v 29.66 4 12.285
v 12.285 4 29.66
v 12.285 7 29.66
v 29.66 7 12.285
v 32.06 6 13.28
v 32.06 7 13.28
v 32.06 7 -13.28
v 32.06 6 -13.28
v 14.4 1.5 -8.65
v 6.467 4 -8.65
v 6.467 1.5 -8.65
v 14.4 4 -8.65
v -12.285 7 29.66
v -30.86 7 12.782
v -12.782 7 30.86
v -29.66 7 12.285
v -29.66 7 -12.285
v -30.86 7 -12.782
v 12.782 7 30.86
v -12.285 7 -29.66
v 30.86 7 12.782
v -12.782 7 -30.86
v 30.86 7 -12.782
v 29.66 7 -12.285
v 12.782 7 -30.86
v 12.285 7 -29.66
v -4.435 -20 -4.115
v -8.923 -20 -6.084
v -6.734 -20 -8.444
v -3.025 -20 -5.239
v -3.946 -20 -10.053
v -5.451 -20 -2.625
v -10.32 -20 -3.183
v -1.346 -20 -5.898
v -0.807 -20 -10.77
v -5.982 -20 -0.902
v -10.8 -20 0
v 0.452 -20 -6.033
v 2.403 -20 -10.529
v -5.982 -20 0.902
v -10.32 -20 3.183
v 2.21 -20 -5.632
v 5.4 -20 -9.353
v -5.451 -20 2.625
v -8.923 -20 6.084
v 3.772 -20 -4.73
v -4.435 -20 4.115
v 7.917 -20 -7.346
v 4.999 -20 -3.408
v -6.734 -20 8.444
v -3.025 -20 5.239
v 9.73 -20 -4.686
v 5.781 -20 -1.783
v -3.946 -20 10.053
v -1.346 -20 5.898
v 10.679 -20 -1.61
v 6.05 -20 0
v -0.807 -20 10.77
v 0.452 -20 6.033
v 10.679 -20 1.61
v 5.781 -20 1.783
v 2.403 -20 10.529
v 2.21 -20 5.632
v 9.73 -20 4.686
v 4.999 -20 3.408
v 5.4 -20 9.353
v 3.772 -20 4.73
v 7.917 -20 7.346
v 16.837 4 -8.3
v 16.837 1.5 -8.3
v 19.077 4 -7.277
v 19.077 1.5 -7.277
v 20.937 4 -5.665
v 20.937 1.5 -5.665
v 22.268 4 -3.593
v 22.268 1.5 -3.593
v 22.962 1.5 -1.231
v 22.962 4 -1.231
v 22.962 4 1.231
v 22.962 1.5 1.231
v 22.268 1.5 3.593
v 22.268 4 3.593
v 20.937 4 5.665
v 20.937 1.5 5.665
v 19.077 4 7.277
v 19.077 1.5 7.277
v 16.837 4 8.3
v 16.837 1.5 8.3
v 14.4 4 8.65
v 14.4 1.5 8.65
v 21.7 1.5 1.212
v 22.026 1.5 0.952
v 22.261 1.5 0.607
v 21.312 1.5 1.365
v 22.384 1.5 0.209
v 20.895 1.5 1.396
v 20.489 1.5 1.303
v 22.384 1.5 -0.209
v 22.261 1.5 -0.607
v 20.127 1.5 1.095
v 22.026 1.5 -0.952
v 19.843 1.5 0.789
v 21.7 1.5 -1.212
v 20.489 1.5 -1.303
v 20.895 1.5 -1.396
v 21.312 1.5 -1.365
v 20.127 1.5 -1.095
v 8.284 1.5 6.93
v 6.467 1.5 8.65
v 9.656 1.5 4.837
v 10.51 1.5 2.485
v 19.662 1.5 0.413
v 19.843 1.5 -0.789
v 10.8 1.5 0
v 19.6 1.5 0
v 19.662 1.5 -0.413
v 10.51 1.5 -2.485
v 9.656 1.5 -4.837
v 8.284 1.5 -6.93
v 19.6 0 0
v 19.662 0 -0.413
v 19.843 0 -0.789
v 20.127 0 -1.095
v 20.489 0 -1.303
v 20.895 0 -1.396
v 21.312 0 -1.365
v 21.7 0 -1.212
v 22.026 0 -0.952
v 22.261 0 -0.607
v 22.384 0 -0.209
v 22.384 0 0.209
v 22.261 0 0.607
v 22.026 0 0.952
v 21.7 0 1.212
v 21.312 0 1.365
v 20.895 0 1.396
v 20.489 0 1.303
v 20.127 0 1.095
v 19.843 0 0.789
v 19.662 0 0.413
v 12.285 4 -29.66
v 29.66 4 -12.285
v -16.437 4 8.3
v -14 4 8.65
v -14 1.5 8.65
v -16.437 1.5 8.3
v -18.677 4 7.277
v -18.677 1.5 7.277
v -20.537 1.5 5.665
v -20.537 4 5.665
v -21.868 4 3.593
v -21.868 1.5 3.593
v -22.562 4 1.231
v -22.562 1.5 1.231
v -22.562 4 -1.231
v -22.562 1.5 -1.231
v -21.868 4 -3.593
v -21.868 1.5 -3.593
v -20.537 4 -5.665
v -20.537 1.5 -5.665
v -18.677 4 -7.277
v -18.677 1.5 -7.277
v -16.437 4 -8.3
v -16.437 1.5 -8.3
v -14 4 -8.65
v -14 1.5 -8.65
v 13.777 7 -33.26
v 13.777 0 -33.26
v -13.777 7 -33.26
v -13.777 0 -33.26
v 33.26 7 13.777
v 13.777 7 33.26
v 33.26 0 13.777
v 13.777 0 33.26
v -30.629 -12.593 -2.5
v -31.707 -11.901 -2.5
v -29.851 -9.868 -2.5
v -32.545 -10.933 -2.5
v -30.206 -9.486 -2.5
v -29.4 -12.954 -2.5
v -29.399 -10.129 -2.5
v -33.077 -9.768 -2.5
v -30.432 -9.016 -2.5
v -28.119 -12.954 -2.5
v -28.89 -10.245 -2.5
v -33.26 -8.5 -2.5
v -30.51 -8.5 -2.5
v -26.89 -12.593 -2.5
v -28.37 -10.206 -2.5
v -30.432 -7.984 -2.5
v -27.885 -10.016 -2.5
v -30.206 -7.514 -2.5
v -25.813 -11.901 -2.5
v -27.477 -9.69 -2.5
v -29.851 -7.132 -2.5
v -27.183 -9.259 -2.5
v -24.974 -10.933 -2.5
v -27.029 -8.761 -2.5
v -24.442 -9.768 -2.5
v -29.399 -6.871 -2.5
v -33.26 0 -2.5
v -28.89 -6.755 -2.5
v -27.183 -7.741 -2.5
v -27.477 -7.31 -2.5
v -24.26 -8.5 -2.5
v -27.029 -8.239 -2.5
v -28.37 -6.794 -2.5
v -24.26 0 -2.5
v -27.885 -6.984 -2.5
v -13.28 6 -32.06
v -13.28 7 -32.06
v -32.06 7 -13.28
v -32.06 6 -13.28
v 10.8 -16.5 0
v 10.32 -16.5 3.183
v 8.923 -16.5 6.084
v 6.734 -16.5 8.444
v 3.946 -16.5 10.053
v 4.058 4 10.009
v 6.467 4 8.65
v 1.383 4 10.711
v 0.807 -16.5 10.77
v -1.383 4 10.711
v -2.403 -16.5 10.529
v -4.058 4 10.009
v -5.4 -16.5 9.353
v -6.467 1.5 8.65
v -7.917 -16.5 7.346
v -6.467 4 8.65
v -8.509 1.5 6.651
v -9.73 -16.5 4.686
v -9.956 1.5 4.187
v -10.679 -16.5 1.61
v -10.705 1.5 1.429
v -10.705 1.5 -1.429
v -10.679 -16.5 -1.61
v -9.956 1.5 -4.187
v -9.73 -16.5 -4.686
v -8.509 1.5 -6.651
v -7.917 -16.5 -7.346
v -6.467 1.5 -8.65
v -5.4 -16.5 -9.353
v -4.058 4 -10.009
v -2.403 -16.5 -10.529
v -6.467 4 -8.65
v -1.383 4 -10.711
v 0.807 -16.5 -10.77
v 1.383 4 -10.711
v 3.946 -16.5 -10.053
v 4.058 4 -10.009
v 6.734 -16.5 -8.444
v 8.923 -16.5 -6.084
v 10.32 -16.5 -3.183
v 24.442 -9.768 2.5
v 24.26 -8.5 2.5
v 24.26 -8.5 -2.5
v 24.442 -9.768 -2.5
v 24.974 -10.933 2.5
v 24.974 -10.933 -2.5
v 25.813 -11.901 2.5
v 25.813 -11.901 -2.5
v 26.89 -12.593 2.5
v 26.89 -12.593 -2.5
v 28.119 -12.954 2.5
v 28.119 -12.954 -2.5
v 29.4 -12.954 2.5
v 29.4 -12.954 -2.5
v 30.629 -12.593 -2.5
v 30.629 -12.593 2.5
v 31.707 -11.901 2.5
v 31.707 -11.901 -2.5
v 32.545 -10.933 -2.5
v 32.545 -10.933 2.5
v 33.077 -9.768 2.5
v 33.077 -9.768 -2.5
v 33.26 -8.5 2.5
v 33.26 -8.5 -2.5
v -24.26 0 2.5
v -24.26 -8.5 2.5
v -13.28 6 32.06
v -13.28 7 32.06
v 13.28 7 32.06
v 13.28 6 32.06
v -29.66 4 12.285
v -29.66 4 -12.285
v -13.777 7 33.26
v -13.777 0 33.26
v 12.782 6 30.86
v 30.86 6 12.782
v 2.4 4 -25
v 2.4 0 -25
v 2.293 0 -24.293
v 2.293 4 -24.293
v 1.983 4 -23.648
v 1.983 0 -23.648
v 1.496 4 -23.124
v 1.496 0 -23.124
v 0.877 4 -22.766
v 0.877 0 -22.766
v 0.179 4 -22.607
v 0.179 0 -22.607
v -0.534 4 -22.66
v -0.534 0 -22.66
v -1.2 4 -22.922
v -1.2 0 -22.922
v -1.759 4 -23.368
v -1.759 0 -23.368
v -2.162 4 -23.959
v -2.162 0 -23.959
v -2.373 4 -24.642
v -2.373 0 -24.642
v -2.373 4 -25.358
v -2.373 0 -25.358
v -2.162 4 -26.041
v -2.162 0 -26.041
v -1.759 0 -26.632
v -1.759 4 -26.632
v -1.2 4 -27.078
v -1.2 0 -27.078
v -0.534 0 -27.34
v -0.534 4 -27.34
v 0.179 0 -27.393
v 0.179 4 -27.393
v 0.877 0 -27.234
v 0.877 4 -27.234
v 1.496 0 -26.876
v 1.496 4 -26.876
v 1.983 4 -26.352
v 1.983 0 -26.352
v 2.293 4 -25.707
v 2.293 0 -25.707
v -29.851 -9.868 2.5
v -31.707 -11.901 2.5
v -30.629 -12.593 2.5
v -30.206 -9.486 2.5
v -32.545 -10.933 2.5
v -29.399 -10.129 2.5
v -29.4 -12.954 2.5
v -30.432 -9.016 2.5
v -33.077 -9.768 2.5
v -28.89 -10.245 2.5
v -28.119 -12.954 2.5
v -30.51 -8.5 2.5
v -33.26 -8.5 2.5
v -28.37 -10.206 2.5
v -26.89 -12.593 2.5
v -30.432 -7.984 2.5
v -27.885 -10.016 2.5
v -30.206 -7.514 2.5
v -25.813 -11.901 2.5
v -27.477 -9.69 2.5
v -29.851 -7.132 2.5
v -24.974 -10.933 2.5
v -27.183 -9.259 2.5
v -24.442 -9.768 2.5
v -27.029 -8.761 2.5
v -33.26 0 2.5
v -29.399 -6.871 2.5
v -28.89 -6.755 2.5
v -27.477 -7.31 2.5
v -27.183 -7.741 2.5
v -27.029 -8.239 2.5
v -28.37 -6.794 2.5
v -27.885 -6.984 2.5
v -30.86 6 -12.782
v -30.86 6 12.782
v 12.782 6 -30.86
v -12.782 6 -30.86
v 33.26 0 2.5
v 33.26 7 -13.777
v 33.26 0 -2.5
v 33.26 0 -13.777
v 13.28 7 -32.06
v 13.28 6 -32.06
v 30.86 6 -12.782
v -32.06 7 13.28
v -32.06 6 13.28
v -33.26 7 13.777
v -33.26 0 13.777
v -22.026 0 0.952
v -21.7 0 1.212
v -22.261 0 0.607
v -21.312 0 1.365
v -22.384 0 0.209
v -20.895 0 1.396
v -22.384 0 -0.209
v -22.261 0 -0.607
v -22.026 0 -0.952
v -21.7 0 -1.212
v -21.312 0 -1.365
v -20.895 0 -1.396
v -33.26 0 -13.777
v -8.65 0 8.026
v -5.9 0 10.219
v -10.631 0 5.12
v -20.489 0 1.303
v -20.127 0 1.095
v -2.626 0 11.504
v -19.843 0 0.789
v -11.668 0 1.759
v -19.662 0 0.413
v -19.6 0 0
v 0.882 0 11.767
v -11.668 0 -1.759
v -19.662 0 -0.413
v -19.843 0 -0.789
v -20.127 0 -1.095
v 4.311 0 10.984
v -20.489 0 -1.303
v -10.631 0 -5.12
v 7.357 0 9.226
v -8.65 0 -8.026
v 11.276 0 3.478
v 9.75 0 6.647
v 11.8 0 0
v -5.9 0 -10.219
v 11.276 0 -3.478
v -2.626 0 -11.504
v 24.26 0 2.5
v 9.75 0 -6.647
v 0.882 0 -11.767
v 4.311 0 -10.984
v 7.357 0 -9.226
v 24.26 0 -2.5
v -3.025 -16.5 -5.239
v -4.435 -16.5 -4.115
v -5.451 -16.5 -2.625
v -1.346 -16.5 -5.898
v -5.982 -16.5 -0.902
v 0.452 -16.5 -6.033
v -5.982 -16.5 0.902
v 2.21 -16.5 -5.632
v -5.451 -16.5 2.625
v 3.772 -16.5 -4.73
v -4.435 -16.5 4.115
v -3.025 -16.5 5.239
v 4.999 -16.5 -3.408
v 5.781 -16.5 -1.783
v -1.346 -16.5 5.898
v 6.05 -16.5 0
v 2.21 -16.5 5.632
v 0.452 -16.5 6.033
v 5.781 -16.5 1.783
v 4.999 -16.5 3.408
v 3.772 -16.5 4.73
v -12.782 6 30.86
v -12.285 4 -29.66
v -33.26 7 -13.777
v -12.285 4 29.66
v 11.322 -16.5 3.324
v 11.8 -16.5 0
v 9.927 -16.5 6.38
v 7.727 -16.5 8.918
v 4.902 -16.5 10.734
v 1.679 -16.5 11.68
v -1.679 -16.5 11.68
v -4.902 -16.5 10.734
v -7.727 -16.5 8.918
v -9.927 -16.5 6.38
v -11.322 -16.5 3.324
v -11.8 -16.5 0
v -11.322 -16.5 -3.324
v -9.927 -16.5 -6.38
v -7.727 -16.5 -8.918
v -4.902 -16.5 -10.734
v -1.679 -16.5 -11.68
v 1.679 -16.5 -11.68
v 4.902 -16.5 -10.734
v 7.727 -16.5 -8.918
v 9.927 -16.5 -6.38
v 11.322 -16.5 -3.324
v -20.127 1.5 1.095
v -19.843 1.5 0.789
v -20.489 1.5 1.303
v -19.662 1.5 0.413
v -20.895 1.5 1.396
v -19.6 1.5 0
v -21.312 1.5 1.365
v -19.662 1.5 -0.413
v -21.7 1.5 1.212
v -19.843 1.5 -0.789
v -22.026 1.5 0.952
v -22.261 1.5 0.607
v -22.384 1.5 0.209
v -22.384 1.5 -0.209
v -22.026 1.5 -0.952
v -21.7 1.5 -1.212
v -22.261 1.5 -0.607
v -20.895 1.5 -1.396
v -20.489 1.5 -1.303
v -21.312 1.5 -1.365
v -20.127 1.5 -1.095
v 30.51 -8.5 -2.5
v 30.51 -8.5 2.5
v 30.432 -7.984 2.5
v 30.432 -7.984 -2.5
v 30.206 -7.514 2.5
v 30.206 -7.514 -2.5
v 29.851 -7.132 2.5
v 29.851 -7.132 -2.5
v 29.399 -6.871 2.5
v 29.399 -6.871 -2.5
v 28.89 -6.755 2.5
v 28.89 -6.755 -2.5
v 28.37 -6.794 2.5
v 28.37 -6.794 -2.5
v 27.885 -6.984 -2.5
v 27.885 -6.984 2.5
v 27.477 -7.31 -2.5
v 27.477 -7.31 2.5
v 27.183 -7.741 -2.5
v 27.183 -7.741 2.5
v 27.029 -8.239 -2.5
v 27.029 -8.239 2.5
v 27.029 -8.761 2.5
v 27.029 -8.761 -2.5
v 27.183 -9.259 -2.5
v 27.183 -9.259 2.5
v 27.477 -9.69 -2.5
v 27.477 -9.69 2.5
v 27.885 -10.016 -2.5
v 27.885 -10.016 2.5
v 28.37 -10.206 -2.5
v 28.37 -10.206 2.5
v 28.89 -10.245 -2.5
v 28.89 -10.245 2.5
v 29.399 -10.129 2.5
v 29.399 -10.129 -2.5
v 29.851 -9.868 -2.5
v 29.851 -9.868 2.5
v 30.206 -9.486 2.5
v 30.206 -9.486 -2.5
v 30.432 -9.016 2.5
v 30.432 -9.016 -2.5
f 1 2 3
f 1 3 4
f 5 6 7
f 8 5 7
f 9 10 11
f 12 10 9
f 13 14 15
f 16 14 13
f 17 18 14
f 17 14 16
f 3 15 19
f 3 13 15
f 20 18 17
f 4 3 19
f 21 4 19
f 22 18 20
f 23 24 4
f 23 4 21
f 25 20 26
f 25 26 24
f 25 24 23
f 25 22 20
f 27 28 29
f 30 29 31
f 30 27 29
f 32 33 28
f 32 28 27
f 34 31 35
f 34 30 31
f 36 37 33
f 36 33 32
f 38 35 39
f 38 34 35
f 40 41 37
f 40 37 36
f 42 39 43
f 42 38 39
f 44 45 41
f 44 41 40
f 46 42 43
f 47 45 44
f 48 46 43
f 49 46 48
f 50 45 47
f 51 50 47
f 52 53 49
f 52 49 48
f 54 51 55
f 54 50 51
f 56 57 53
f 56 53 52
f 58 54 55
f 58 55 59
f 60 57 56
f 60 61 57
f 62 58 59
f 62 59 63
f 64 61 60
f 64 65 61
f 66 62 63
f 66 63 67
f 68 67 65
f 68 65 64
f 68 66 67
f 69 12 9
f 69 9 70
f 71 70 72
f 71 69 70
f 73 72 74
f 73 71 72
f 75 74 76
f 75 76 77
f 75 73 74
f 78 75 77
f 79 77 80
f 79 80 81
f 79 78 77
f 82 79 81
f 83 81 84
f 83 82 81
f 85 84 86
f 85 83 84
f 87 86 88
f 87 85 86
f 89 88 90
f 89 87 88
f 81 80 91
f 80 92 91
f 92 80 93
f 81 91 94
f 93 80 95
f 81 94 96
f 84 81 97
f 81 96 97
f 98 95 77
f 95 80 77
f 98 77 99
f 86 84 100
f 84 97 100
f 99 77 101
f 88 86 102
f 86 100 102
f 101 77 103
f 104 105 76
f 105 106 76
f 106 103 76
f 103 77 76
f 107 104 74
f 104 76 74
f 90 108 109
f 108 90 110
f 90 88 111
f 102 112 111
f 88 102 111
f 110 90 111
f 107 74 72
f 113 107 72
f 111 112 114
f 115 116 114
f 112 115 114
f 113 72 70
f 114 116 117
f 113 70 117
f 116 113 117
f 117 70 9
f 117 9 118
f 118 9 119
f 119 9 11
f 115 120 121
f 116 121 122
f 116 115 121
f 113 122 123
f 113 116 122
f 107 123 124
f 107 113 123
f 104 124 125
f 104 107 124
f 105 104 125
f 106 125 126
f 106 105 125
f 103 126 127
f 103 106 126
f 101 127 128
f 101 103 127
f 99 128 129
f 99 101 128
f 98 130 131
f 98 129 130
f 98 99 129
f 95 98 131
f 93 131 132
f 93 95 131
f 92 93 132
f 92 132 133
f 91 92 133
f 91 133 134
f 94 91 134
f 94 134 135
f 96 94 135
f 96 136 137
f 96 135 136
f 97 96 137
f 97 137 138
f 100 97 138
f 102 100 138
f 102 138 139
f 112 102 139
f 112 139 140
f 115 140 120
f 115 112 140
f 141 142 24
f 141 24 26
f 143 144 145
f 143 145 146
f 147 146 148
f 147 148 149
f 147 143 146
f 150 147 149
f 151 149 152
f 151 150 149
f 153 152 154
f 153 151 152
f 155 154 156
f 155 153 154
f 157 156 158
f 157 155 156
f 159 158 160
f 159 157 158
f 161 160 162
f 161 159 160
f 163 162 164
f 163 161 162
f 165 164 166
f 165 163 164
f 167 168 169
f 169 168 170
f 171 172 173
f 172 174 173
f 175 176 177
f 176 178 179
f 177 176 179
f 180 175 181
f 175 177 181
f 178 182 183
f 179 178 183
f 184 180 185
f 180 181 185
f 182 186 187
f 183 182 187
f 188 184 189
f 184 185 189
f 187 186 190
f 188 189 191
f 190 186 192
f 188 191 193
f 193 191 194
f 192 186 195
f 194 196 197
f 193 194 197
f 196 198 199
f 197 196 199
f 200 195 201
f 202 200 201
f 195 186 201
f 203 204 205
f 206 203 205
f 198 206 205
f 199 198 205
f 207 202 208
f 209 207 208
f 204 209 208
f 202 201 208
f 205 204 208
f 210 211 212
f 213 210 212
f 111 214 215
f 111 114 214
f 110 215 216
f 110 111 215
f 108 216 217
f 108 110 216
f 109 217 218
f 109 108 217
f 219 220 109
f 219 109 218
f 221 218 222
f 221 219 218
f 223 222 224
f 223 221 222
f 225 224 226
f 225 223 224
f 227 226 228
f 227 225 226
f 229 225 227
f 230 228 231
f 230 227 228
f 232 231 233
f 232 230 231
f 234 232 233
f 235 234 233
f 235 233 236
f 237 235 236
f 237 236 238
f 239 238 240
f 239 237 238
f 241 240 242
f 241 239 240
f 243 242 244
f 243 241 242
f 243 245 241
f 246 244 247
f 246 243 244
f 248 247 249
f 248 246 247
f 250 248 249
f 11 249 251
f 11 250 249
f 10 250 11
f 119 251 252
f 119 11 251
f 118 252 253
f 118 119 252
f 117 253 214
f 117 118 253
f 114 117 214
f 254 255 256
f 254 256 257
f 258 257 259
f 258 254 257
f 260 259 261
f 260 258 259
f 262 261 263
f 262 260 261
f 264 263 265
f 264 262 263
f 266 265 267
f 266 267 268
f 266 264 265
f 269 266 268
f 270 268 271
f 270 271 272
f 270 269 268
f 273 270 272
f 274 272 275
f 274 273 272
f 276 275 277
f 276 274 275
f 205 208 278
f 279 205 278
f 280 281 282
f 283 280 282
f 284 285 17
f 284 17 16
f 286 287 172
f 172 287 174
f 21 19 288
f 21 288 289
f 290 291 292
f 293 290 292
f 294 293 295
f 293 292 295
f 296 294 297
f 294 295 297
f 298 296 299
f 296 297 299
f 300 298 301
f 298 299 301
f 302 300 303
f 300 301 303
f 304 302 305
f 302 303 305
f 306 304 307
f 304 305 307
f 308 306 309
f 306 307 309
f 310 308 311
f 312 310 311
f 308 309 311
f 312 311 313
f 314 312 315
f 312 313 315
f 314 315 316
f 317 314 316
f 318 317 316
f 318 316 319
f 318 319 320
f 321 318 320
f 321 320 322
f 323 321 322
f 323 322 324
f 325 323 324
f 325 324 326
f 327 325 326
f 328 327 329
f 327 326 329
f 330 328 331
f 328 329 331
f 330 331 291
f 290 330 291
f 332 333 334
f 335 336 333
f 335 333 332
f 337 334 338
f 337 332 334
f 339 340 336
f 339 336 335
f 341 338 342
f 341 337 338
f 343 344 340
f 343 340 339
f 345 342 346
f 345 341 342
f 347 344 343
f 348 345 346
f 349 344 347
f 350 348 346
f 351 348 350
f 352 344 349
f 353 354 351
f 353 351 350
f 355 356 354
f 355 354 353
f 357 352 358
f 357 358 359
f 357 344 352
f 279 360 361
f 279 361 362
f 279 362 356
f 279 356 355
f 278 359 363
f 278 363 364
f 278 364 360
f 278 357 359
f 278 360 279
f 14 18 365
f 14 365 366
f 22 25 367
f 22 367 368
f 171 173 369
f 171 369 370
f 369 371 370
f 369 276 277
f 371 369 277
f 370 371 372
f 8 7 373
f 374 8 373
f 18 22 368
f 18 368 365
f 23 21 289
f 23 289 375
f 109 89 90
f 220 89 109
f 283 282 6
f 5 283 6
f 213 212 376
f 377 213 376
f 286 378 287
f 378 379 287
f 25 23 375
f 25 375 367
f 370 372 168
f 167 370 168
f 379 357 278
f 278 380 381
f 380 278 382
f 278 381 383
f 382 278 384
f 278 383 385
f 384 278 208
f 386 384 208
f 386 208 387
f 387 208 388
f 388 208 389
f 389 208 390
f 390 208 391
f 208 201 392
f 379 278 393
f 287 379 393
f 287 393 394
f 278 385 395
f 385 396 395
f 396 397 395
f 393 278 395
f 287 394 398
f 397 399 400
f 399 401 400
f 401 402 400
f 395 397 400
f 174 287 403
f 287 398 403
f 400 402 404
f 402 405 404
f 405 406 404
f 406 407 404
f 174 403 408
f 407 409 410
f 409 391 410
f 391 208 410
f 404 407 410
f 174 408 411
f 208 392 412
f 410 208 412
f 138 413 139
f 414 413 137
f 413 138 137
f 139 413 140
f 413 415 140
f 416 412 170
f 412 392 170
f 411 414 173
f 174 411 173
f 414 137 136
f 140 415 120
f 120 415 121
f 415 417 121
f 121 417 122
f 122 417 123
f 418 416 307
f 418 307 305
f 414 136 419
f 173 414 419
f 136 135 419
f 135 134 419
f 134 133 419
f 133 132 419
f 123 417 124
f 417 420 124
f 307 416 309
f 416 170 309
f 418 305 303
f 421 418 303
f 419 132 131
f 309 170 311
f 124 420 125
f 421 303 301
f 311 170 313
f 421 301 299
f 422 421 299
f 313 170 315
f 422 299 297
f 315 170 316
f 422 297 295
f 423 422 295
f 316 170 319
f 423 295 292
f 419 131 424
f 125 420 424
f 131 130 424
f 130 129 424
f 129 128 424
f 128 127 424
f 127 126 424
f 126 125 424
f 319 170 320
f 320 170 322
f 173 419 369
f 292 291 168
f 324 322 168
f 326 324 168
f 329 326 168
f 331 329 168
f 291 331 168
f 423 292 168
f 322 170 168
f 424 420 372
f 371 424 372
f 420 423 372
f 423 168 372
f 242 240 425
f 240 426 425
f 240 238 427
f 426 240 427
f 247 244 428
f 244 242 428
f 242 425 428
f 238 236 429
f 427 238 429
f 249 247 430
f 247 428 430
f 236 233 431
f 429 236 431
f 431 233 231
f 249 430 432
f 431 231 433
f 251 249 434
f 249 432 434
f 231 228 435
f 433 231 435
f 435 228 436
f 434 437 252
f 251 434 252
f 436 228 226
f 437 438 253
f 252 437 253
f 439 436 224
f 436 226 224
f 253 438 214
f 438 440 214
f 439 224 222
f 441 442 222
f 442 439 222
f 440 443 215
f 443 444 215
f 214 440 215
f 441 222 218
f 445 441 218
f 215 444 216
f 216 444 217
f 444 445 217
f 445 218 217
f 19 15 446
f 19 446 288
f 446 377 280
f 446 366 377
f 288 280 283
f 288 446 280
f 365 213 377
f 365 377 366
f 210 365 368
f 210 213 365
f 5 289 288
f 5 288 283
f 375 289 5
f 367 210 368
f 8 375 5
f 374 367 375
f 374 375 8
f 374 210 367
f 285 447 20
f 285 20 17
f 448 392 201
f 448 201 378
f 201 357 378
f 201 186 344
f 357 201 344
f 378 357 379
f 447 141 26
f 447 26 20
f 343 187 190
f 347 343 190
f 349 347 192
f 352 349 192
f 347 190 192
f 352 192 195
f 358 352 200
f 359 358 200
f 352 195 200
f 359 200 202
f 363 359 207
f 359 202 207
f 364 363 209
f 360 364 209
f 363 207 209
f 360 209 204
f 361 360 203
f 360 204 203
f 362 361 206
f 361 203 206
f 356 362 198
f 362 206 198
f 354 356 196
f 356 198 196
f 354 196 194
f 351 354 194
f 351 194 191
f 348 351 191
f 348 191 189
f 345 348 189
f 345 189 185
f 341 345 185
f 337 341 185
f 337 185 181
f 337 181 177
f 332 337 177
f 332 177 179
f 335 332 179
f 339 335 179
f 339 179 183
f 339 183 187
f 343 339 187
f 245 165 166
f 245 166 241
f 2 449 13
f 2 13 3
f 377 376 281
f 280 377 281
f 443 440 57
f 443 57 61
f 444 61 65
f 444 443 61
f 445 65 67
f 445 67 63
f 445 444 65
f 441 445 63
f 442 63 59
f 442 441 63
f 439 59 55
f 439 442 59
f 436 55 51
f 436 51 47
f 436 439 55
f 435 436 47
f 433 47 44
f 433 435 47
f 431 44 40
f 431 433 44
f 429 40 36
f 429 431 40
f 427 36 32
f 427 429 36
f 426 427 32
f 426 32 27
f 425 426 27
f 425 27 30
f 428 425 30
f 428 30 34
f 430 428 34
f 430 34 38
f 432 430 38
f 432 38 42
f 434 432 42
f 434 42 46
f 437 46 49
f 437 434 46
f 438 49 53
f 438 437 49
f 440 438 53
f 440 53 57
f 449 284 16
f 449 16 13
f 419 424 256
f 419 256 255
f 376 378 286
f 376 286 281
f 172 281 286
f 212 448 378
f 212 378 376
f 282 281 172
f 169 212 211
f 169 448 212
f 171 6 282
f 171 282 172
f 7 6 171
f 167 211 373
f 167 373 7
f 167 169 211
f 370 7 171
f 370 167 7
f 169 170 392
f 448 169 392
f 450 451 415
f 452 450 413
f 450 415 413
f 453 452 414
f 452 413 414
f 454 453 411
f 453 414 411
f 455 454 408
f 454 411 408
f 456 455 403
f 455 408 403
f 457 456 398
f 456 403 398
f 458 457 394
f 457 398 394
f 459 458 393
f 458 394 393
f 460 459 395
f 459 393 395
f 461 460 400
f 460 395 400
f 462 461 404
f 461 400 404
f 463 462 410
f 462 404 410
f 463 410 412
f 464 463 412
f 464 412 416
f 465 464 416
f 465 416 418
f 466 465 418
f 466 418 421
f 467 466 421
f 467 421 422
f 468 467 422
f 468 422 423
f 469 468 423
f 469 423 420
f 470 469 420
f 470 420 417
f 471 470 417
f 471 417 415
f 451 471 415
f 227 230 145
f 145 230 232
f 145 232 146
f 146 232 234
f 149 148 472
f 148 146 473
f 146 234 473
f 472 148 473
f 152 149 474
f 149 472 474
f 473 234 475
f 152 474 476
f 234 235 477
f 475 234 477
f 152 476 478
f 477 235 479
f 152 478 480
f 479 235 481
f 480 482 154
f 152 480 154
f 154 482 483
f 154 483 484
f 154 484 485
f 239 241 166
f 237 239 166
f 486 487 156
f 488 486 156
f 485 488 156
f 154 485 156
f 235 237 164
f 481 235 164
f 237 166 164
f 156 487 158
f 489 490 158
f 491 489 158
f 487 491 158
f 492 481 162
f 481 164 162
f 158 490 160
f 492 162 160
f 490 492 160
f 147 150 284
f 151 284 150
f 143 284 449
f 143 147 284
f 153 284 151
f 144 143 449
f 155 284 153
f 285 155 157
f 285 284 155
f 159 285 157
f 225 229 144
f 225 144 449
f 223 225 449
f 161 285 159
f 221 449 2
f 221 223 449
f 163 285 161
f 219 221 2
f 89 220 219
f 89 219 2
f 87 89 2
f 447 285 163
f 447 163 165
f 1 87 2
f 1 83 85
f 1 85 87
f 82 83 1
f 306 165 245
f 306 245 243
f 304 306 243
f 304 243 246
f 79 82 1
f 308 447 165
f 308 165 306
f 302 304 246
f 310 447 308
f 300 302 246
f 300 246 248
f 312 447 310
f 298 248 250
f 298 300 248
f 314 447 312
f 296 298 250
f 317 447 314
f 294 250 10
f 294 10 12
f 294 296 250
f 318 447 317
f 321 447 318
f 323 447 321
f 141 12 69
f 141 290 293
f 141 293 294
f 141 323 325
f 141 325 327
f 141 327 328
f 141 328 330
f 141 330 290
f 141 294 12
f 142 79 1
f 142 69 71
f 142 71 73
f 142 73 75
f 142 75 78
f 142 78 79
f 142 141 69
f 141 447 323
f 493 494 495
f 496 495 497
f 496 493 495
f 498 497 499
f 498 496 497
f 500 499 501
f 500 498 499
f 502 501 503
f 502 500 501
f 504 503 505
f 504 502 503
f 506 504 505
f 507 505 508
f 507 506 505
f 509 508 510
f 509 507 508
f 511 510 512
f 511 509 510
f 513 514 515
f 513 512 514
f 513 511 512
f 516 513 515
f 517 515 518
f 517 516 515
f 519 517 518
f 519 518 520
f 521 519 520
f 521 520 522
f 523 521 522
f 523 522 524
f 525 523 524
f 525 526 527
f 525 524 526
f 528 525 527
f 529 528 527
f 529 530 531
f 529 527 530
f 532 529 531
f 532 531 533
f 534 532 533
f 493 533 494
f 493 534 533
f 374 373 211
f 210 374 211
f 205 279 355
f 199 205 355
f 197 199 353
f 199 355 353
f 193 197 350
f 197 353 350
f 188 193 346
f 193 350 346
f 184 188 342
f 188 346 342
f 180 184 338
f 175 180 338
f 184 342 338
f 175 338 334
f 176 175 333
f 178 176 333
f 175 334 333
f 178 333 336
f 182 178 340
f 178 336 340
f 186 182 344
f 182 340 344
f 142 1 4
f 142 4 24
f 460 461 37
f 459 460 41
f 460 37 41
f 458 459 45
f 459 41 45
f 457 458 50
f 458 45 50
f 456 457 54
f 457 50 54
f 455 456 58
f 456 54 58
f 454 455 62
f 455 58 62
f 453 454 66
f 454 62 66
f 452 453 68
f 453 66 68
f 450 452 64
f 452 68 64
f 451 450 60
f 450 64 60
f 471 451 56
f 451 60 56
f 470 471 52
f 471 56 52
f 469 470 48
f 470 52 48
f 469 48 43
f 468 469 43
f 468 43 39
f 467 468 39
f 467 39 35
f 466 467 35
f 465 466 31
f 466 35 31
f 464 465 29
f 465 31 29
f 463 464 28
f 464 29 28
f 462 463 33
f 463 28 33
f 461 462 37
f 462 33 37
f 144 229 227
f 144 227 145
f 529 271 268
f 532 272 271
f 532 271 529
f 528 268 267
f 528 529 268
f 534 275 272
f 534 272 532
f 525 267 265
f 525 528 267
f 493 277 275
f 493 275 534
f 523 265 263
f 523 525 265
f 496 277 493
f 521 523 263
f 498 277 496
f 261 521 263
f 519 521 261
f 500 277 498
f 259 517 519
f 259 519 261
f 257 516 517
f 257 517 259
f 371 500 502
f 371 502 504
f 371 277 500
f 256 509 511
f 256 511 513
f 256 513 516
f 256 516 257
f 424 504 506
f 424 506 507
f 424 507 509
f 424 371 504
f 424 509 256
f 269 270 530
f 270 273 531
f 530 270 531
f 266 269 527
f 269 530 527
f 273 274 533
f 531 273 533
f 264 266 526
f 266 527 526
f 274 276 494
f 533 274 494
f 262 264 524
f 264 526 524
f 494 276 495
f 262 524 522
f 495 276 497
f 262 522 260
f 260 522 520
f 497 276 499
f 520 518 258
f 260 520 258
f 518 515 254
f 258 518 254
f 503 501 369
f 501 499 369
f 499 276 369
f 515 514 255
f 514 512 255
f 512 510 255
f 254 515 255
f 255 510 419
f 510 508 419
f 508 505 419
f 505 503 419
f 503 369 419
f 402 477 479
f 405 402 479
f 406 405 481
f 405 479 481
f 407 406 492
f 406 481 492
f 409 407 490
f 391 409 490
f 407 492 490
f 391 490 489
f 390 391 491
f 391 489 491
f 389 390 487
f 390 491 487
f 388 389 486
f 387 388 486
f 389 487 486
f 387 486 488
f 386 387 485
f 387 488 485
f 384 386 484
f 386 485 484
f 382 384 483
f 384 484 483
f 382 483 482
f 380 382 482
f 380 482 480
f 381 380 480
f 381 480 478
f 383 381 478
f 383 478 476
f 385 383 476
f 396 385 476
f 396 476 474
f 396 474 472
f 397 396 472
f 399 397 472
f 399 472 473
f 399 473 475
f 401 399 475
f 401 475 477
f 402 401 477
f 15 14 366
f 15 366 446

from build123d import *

# Parameters (mm, degrees)
EXTRUDE_1_DEPTH      = 4
SKETCH_2_R           = 2.4
CUT_EXTRUDE_1_DEPTH  = 4
EXTRUDE_3_DEPTH      = 3
CUT_EXTRUDE_2_DEPTH  = 1
SKETCH_7_R           = 10.8
CUT_EXTRUDE_4_DEPTH  = 4
SKETCH_8_R           = 11.8
SKETCH_8_R_2         = 10.8
EXTRUDE_4_DEPTH      = 16.5
SKETCH_9_R           = 10.8
SKETCH_9_R_2         = 6.05
EXTRUDE_5_DEPTH      = 3.5
CUT_EXTRUDE_5_DEPTH  = 2.5
SKETCH_13_W          = 9
SKETCH_13_H          = 5
EXTRUDE_7_DEPTH      = 8.5
SKETCH_16_R          = 1.4
CUT_EXTRUDE_8_DEPTH  = 10
SKETCH_19_ONE_SIDE_W = 4.5
SKETCH_19_ONE_SIDE_H = 5
SKETCH_20_R          = 1.75
CUT_EXTRUDE_9_DEPTH  = 36.75966317


with BuildPart() as part:
    # 스케치1 → 보스-돌출1 (new body)
    with BuildSketch(Plane(origin=(0, 0, 0), x_dir=(1, 0, 0), z_dir=(0, 1, 0))):
        Polygon((13.776603565, -33.25966317), (33.25966317, -13.776603565), (33.25966317, 13.776603565), (13.776603565, 33.25966317), (-13.776603565, 33.25966317), (-33.25966317, 13.776603565), (-33.25966317, -13.776603565), (-13.776603565, -33.25966317), align=None)
    extrude(amount=EXTRUDE_1_DEPTH)

    # 스케치2 → 컷-돌출1 (cut)
    with BuildSketch(Plane.XZ):
        with Locations((0, -25)):
            Circle(SKETCH_2_R)
    extrude(amount=-CUT_EXTRUDE_1_DEPTH, mode=Mode.SUBTRACT)

    # 스케치3 → 보스-돌출3 (add)
    with BuildSketch(Plane(origin=(0, 4, 0), x_dir=(1, 0, 0), z_dir=(0, 1, 0))):
        Polygon((-13.776603565, 33.25966317), (-33.25966317, 13.776603565), (-33.25966317, -13.776603565), (-13.776603565, -33.25966317), (13.776603565, -33.25966317), (33.25966317, -13.776603565), (33.25966317, 13.776603565), (13.776603565, 33.25966317), align=None)
        Polygon((-12.285434741, 29.65966317), (-29.65966317, 12.285434741), (-29.65966317, -12.285434741), (-12.285434741, -29.65966317), (12.285434741, -29.65966317), (29.65966317, -12.285434741), (29.65966317, 12.285434741), (12.285434741, 29.65966317), align=None, mode=Mode.SUBTRACT)
    extrude(amount=EXTRUDE_3_DEPTH)

    # 스케치5 → 컷-돌출2 (cut)
    with BuildSketch(Plane(origin=(0, 7, 0), x_dir=(1, 0, 0), z_dir=(0, 1, 0))):
        Polygon((32.05966317, -13.27954729), (32.05966317, 13.27954729), (13.27954729, 32.05966317), (-13.27954729, 32.05966317), (-32.05966317, 13.27954729), (-32.05966317, -13.27954729), (-13.27954729, -32.05966317), (13.27954729, -32.05966317), align=None)
        Polygon((30.85966317, 12.782491015), (12.782491015, 30.85966317), (-12.782491015, 30.85966317), (-30.85966317, 12.782491015), (-30.85966317, -12.782491015), (-12.782491015, -30.85966317), (12.782491015, -30.85966317), (30.85966317, -12.782491015), align=None, mode=Mode.SUBTRACT)
    extrude(amount=-CUT_EXTRUDE_2_DEPTH, mode=Mode.SUBTRACT)

    # 스케치7 → 컷-돌출4 (cut)
    with BuildSketch(Plane.XZ):
        Circle(SKETCH_7_R)
    extrude(amount=-CUT_EXTRUDE_4_DEPTH, mode=Mode.SUBTRACT)

    # 스케치8 → 보스-돌출4 (add)
    with BuildSketch(Plane.XZ):
        Circle(SKETCH_8_R)
        Circle(SKETCH_8_R_2, mode=Mode.SUBTRACT)
    extrude(amount=EXTRUDE_4_DEPTH)



with BuildPart() as body_2:
    # 스케치9 → 보스-돌출5 (new body)
    with BuildSketch(Plane.XZ.offset(16.5)):
        Circle(SKETCH_9_R)
        Circle(SKETCH_9_R_2, mode=Mode.SUBTRACT)
    extrude(amount=EXTRUDE_5_DEPTH)


with BuildPart() as part_1:
    add(part.part)

    add(body_2.part)  # 회전1 merges body 2
    # 스케치10 → 회전1 (revolve)
    with BuildSketch(Plane.XY):
        Polygon((-11.8, -16.5), (-10.8, -20), (-10.8, -16.5), align=None)
    revolve(axis=Axis((0, -20, 0), (0, 1, 0)))

    # 스케치11 → 컷-돌출5 (cut)
    with BuildSketch(Plane(origin=(0, 4, 0), x_dir=(1, 0, 0), z_dir=(0, 1, 0))):
        with BuildLine():
            Line((-14, 8.65), (14.4, 8.65))
            ThreePointArc((14.4, 8.65), (23.05, 0), (14.4, -8.65))
            Line((14.4, -8.65), (-14, -8.65))
            ThreePointArc((-14, -8.65), (-22.65, 0), (-14, 8.65))
        make_face()
    extrude(amount=-CUT_EXTRUDE_5_DEPTH, mode=Mode.SUBTRACT)

    # 스케치13 → 보스-돌출7 (add)
    with BuildSketch(Plane.XZ):
        with Locations((-28.75966317, 0)):
            Rectangle(SKETCH_13_W, SKETCH_13_H)
    extrude_7 = extrude(amount=EXTRUDE_7_DEPTH)

    # 스케치16 → 컷-돌출8 (cut)
    with BuildSketch(Plane(origin=(0, 1.5, 0), x_dir=(1, 0, 0), z_dir=(0, 1, 0))):
        with Locations((-21, 0)):
            Circle(SKETCH_16_R)
    cut_extrude_8 = extrude(amount=-CUT_EXTRUDE_8_DEPTH, mode=Mode.SUBTRACT)

    # 대칭 복사2: 컷-돌출8 across plane
    add(cut_extrude_8.mirror(Plane(origin=(0, 0, 0), x_dir=(0, 0, 1), z_dir=(1, 0, 0))), mode=Mode.SUBTRACT)

    # 스케치19 one side → 회전2 (revolve)
    with BuildSketch(Plane.XZ.offset(8.5)):
        with Locations((-26.50966317, 0)):
            Rectangle(SKETCH_19_ONE_SIDE_W, SKETCH_19_ONE_SIDE_H)
    revolve_2 = revolve(axis=Axis((-28.75966317, -8.5, 5.440491611), (0, 0, -1)))

    # 스케치20 → 컷-돌출9 (cut, through all)
    with BuildSketch(Plane(origin=(0, 0, -2.5), x_dir=(-1, 0, 0), z_dir=(0, 0, -1))):
        with Locations((28.75966317, -8.5)):
            Circle(SKETCH_20_R)
    cut_extrude_9 = extrude(amount=-CUT_EXTRUDE_9_DEPTH, mode=Mode.SUBTRACT)

    # 대칭 복사3: 보스-돌출7, 회전2, 컷-돌출9 across plane
    add(extrude_7.mirror(Plane(origin=(0, 0, 0), x_dir=(0, 0, 1), z_dir=(1, 0, 0))))
    add(revolve_2.mirror(Plane(origin=(0, 0, 0), x_dir=(0, 0, 1), z_dir=(1, 0, 0))))
    add(cut_extrude_9.mirror(Plane(origin=(0, 0, 0), x_dir=(0, 0, 1), z_dir=(1, 0, 0))), mode=Mode.SUBTRACT)


solid = part_1.part
